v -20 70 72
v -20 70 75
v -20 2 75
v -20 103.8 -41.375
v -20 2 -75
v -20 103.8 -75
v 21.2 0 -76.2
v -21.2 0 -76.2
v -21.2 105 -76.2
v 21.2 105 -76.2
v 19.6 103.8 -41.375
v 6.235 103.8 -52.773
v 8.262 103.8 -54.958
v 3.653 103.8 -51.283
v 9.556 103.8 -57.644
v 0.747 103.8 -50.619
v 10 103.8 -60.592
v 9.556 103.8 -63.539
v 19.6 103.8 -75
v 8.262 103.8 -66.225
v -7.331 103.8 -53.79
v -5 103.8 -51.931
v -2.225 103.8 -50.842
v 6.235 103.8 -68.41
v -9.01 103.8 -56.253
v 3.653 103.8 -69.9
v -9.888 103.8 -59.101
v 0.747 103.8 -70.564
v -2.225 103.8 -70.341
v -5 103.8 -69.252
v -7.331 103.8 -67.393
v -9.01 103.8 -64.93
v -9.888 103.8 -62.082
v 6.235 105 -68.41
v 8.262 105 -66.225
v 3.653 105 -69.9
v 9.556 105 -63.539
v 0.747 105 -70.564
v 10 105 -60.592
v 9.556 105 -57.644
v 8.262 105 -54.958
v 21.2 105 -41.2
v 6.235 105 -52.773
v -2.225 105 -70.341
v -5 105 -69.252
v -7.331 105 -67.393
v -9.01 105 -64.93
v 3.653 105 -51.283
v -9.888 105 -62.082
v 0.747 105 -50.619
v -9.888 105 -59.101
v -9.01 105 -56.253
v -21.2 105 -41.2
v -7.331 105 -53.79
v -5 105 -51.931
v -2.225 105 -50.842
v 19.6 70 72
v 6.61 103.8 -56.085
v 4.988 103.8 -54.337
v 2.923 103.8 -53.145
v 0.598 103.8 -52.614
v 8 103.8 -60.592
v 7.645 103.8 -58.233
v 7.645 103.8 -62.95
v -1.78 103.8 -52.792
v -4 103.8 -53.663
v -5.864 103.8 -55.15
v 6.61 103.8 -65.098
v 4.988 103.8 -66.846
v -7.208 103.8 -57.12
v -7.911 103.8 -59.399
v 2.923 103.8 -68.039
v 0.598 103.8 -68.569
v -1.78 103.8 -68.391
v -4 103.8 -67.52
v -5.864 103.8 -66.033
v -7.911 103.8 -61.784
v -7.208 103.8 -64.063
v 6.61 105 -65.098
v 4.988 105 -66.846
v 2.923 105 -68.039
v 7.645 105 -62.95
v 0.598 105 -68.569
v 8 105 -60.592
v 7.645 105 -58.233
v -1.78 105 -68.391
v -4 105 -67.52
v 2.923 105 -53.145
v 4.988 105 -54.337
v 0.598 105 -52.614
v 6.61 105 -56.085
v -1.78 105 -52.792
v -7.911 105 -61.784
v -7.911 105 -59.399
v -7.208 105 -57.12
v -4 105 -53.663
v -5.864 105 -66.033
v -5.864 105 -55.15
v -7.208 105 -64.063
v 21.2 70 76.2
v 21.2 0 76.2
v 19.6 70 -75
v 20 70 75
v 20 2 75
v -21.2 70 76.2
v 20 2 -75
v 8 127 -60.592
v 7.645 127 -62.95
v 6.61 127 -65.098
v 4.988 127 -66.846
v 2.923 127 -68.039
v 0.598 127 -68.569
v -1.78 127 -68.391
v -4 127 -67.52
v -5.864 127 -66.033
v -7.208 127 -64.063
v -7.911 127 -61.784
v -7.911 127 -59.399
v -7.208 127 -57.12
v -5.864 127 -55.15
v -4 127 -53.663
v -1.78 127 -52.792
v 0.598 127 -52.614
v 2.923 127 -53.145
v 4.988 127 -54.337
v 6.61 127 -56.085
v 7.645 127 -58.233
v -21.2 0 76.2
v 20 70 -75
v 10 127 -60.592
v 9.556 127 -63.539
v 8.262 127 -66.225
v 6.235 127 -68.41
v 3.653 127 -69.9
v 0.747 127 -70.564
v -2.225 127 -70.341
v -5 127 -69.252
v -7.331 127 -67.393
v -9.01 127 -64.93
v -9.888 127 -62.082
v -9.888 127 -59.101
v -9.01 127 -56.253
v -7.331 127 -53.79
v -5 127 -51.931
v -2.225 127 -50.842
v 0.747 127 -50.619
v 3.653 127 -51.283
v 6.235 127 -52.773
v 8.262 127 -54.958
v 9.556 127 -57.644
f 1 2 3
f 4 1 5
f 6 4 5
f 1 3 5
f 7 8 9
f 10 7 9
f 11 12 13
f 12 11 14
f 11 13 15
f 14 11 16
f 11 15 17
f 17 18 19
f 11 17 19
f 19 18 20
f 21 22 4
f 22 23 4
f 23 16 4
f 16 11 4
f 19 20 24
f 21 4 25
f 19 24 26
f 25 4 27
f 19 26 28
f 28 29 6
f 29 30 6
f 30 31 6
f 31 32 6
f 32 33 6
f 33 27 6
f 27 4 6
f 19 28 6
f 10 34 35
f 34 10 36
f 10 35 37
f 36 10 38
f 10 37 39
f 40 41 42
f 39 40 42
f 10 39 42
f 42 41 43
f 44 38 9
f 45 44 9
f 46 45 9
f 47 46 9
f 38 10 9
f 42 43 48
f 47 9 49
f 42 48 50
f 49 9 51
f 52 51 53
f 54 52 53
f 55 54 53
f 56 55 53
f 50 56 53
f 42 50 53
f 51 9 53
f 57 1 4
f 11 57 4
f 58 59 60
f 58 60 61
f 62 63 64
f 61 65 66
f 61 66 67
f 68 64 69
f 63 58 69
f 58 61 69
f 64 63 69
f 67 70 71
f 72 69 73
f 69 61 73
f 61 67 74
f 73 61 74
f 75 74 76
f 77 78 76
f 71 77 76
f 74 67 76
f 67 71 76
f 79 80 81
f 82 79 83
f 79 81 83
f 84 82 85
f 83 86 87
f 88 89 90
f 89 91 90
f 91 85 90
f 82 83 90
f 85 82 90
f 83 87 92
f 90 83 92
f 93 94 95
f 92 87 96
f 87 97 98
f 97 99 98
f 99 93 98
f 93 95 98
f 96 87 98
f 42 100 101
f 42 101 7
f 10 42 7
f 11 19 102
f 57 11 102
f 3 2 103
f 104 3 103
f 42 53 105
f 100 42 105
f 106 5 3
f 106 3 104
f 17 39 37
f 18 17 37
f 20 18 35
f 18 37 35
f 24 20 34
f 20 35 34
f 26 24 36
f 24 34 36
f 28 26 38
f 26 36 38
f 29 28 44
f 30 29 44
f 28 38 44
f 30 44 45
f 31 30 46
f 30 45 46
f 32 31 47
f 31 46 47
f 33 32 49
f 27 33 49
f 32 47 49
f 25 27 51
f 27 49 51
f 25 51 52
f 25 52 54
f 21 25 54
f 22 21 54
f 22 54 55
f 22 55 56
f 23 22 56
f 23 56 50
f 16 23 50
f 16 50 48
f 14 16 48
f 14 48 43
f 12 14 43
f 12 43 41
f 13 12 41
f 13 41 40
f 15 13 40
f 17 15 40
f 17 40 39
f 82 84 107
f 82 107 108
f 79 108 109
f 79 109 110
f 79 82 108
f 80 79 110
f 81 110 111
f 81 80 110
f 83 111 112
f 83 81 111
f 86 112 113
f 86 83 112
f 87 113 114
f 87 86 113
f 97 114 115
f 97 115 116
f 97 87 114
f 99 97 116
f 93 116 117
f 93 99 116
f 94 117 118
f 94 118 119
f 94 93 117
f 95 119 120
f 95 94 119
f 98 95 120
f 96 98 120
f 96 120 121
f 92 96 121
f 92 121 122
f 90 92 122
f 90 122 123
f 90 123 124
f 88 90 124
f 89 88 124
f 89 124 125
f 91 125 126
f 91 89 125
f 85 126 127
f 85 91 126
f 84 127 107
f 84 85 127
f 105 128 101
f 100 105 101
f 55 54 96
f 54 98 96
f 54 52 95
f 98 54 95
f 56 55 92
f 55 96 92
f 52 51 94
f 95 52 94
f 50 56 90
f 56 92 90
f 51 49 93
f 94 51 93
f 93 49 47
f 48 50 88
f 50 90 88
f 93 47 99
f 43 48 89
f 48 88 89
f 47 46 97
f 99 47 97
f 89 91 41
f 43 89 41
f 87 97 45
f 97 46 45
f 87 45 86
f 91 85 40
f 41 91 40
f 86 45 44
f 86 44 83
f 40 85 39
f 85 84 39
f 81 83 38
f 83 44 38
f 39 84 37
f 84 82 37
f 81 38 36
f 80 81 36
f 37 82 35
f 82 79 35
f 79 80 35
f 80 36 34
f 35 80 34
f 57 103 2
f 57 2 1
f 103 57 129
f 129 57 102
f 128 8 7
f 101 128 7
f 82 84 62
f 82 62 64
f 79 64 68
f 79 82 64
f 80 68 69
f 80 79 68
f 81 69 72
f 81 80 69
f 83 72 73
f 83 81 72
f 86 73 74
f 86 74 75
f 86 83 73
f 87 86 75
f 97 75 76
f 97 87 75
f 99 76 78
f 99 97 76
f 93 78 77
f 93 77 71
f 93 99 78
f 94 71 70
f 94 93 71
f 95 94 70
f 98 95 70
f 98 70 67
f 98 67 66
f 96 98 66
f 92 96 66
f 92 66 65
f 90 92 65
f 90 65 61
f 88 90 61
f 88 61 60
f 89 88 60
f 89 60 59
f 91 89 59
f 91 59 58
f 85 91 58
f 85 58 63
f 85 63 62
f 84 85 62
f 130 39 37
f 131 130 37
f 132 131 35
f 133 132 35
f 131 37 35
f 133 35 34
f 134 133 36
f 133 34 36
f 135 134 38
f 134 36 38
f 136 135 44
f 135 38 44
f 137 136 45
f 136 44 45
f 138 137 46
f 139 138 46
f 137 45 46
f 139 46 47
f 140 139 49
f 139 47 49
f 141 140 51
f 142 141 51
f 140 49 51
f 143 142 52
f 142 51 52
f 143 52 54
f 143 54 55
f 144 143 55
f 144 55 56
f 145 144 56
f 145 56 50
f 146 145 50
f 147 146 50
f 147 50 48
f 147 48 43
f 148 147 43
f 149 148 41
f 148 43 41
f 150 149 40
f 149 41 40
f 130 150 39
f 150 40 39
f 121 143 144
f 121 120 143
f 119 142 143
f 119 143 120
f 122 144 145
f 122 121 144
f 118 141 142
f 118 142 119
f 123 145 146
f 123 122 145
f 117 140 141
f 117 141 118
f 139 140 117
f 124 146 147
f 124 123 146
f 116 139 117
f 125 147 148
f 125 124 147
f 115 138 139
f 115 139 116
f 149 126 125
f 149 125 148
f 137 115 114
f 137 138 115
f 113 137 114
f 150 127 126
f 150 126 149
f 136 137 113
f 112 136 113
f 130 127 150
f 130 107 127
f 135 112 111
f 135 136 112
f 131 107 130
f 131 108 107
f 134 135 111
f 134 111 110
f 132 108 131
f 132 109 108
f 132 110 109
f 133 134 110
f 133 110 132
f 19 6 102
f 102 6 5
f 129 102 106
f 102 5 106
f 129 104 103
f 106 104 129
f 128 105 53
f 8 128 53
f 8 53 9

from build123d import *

# Parameters (mm, degrees)
SZKIC1_W                    = 42.4
SZKIC1_H                    = 152.4
SZKIC1_W_2                  = 40
SZKIC1_H_2                  = 150
DODANIE_WYCI_GNI_CIE1_DEPTH = 70
SZKIC1_2_W                  = 40
SZKIC1_2_H                  = 150
DODANIE_WYCI_GNI_CIE2_DEPTH = 2
DODANIE_WYCI_GNI_CIE3_DEPTH = 42.4
WYTNIJ_WYCI_GNI_CIE1_START  = -1.2
WYTNIJ_WYCI_GNI_CIE1_DEPTH  = 39.6
SZKIC3_R                    = 10
SZKIC3_R_2                  = 8
DODANIE_WYCI_GNI_CIE4_DEPTH = 22
WYTNIJ_WYCI_GNI_CIE2_REACH  = 107
SZKIC3_2_R                  = 10
SZKIC3_2_R_2                = 8


with BuildPart() as part:
    # Szkic1 → Dodanie-wyci_gni_cie1 (new body)
    with BuildSketch(Plane(origin=(0, 0, 0), x_dir=(1, 0, 0), z_dir=(0, 1, 0))):
        Rectangle(SZKIC1_W, SZKIC1_H)
        Rectangle(SZKIC1_W_2, SZKIC1_H_2, mode=Mode.SUBTRACT)
    extrude(amount=DODANIE_WYCI_GNI_CIE1_DEPTH)

    # Szkic1_2 → Dodanie-wyci_gni_cie2 (add)
    with BuildSketch(Plane(origin=(0, 0, 0), x_dir=(1, 0, 0), z_dir=(0, 1, 0))):
        Rectangle(SZKIC1_2_W, SZKIC1_2_H)
    extrude(amount=DODANIE_WYCI_GNI_CIE2_DEPTH)

    # Szkic2 → Dodanie-wyci_gni_cie3 (add)
    with BuildSketch(Plane.ZY.offset(21.2)):
        Polygon((-76.2, 70), (-76.2, 105), (-41.2, 105), (76.2, 70), align=None)
    extrude(amount=-DODANIE_WYCI_GNI_CIE3_DEPTH)

    # Szkic2_4 → Wytnij-wyci_gni_cie1 (cut)
    with BuildSketch(Plane.ZY.offset(21.2).offset(WYTNIJ_WYCI_GNI_CIE1_START)):
        Polygon((-75, 103.8), (-75, 70), (71.999788693, 70), (-41.375068449, 103.8), align=None)
    extrude(amount=-WYTNIJ_WYCI_GNI_CIE1_DEPTH, mode=Mode.SUBTRACT)

    # Szkic3 → Dodanie-wyci_gni_cie4 (add)
    with BuildSketch(Plane(origin=(0, 105, 0), x_dir=(1, 0, 0), z_dir=(0, 1, 0))):
        with Locations((0, 60.59151108)):
            Circle(SZKIC3_R)
        with Locations((0, 60.59151108)):
            Circle(SZKIC3_R_2, mode=Mode.SUBTRACT)
    extrude(amount=DODANIE_WYCI_GNI_CIE4_DEPTH)

    # Szkic3_2 → Wytnij-wyci_gni_cie2 (cut, up to next)
    with BuildSketch(Plane(origin=(0, 105, 0), x_dir=(1, 0, 0), z_dir=(0, 1, 0)), mode=Mode.PRIVATE) as wytnij_wyci_gni_cie2_sk1:
        with Locations((0, 60.59151108)):
            Circle(SZKIC3_2_R)
        with Locations((0, 60.59151108)):
            Circle(SZKIC3_2_R_2, mode=Mode.SUBTRACT)
    wytnij_wyci_gni_cie2_tool1 = extrude(wytnij_wyci_gni_cie2_sk1.sketch, amount=-WYTNIJ_WYCI_GNI_CIE2_REACH, mode=Mode.PRIVATE) & part.part
    add(wytnij_wyci_gni_cie2_tool1.solids().sort_by_distance((-9.717157, 105, -60.591511))[0], mode=Mode.SUBTRACT)


solid = part.part
